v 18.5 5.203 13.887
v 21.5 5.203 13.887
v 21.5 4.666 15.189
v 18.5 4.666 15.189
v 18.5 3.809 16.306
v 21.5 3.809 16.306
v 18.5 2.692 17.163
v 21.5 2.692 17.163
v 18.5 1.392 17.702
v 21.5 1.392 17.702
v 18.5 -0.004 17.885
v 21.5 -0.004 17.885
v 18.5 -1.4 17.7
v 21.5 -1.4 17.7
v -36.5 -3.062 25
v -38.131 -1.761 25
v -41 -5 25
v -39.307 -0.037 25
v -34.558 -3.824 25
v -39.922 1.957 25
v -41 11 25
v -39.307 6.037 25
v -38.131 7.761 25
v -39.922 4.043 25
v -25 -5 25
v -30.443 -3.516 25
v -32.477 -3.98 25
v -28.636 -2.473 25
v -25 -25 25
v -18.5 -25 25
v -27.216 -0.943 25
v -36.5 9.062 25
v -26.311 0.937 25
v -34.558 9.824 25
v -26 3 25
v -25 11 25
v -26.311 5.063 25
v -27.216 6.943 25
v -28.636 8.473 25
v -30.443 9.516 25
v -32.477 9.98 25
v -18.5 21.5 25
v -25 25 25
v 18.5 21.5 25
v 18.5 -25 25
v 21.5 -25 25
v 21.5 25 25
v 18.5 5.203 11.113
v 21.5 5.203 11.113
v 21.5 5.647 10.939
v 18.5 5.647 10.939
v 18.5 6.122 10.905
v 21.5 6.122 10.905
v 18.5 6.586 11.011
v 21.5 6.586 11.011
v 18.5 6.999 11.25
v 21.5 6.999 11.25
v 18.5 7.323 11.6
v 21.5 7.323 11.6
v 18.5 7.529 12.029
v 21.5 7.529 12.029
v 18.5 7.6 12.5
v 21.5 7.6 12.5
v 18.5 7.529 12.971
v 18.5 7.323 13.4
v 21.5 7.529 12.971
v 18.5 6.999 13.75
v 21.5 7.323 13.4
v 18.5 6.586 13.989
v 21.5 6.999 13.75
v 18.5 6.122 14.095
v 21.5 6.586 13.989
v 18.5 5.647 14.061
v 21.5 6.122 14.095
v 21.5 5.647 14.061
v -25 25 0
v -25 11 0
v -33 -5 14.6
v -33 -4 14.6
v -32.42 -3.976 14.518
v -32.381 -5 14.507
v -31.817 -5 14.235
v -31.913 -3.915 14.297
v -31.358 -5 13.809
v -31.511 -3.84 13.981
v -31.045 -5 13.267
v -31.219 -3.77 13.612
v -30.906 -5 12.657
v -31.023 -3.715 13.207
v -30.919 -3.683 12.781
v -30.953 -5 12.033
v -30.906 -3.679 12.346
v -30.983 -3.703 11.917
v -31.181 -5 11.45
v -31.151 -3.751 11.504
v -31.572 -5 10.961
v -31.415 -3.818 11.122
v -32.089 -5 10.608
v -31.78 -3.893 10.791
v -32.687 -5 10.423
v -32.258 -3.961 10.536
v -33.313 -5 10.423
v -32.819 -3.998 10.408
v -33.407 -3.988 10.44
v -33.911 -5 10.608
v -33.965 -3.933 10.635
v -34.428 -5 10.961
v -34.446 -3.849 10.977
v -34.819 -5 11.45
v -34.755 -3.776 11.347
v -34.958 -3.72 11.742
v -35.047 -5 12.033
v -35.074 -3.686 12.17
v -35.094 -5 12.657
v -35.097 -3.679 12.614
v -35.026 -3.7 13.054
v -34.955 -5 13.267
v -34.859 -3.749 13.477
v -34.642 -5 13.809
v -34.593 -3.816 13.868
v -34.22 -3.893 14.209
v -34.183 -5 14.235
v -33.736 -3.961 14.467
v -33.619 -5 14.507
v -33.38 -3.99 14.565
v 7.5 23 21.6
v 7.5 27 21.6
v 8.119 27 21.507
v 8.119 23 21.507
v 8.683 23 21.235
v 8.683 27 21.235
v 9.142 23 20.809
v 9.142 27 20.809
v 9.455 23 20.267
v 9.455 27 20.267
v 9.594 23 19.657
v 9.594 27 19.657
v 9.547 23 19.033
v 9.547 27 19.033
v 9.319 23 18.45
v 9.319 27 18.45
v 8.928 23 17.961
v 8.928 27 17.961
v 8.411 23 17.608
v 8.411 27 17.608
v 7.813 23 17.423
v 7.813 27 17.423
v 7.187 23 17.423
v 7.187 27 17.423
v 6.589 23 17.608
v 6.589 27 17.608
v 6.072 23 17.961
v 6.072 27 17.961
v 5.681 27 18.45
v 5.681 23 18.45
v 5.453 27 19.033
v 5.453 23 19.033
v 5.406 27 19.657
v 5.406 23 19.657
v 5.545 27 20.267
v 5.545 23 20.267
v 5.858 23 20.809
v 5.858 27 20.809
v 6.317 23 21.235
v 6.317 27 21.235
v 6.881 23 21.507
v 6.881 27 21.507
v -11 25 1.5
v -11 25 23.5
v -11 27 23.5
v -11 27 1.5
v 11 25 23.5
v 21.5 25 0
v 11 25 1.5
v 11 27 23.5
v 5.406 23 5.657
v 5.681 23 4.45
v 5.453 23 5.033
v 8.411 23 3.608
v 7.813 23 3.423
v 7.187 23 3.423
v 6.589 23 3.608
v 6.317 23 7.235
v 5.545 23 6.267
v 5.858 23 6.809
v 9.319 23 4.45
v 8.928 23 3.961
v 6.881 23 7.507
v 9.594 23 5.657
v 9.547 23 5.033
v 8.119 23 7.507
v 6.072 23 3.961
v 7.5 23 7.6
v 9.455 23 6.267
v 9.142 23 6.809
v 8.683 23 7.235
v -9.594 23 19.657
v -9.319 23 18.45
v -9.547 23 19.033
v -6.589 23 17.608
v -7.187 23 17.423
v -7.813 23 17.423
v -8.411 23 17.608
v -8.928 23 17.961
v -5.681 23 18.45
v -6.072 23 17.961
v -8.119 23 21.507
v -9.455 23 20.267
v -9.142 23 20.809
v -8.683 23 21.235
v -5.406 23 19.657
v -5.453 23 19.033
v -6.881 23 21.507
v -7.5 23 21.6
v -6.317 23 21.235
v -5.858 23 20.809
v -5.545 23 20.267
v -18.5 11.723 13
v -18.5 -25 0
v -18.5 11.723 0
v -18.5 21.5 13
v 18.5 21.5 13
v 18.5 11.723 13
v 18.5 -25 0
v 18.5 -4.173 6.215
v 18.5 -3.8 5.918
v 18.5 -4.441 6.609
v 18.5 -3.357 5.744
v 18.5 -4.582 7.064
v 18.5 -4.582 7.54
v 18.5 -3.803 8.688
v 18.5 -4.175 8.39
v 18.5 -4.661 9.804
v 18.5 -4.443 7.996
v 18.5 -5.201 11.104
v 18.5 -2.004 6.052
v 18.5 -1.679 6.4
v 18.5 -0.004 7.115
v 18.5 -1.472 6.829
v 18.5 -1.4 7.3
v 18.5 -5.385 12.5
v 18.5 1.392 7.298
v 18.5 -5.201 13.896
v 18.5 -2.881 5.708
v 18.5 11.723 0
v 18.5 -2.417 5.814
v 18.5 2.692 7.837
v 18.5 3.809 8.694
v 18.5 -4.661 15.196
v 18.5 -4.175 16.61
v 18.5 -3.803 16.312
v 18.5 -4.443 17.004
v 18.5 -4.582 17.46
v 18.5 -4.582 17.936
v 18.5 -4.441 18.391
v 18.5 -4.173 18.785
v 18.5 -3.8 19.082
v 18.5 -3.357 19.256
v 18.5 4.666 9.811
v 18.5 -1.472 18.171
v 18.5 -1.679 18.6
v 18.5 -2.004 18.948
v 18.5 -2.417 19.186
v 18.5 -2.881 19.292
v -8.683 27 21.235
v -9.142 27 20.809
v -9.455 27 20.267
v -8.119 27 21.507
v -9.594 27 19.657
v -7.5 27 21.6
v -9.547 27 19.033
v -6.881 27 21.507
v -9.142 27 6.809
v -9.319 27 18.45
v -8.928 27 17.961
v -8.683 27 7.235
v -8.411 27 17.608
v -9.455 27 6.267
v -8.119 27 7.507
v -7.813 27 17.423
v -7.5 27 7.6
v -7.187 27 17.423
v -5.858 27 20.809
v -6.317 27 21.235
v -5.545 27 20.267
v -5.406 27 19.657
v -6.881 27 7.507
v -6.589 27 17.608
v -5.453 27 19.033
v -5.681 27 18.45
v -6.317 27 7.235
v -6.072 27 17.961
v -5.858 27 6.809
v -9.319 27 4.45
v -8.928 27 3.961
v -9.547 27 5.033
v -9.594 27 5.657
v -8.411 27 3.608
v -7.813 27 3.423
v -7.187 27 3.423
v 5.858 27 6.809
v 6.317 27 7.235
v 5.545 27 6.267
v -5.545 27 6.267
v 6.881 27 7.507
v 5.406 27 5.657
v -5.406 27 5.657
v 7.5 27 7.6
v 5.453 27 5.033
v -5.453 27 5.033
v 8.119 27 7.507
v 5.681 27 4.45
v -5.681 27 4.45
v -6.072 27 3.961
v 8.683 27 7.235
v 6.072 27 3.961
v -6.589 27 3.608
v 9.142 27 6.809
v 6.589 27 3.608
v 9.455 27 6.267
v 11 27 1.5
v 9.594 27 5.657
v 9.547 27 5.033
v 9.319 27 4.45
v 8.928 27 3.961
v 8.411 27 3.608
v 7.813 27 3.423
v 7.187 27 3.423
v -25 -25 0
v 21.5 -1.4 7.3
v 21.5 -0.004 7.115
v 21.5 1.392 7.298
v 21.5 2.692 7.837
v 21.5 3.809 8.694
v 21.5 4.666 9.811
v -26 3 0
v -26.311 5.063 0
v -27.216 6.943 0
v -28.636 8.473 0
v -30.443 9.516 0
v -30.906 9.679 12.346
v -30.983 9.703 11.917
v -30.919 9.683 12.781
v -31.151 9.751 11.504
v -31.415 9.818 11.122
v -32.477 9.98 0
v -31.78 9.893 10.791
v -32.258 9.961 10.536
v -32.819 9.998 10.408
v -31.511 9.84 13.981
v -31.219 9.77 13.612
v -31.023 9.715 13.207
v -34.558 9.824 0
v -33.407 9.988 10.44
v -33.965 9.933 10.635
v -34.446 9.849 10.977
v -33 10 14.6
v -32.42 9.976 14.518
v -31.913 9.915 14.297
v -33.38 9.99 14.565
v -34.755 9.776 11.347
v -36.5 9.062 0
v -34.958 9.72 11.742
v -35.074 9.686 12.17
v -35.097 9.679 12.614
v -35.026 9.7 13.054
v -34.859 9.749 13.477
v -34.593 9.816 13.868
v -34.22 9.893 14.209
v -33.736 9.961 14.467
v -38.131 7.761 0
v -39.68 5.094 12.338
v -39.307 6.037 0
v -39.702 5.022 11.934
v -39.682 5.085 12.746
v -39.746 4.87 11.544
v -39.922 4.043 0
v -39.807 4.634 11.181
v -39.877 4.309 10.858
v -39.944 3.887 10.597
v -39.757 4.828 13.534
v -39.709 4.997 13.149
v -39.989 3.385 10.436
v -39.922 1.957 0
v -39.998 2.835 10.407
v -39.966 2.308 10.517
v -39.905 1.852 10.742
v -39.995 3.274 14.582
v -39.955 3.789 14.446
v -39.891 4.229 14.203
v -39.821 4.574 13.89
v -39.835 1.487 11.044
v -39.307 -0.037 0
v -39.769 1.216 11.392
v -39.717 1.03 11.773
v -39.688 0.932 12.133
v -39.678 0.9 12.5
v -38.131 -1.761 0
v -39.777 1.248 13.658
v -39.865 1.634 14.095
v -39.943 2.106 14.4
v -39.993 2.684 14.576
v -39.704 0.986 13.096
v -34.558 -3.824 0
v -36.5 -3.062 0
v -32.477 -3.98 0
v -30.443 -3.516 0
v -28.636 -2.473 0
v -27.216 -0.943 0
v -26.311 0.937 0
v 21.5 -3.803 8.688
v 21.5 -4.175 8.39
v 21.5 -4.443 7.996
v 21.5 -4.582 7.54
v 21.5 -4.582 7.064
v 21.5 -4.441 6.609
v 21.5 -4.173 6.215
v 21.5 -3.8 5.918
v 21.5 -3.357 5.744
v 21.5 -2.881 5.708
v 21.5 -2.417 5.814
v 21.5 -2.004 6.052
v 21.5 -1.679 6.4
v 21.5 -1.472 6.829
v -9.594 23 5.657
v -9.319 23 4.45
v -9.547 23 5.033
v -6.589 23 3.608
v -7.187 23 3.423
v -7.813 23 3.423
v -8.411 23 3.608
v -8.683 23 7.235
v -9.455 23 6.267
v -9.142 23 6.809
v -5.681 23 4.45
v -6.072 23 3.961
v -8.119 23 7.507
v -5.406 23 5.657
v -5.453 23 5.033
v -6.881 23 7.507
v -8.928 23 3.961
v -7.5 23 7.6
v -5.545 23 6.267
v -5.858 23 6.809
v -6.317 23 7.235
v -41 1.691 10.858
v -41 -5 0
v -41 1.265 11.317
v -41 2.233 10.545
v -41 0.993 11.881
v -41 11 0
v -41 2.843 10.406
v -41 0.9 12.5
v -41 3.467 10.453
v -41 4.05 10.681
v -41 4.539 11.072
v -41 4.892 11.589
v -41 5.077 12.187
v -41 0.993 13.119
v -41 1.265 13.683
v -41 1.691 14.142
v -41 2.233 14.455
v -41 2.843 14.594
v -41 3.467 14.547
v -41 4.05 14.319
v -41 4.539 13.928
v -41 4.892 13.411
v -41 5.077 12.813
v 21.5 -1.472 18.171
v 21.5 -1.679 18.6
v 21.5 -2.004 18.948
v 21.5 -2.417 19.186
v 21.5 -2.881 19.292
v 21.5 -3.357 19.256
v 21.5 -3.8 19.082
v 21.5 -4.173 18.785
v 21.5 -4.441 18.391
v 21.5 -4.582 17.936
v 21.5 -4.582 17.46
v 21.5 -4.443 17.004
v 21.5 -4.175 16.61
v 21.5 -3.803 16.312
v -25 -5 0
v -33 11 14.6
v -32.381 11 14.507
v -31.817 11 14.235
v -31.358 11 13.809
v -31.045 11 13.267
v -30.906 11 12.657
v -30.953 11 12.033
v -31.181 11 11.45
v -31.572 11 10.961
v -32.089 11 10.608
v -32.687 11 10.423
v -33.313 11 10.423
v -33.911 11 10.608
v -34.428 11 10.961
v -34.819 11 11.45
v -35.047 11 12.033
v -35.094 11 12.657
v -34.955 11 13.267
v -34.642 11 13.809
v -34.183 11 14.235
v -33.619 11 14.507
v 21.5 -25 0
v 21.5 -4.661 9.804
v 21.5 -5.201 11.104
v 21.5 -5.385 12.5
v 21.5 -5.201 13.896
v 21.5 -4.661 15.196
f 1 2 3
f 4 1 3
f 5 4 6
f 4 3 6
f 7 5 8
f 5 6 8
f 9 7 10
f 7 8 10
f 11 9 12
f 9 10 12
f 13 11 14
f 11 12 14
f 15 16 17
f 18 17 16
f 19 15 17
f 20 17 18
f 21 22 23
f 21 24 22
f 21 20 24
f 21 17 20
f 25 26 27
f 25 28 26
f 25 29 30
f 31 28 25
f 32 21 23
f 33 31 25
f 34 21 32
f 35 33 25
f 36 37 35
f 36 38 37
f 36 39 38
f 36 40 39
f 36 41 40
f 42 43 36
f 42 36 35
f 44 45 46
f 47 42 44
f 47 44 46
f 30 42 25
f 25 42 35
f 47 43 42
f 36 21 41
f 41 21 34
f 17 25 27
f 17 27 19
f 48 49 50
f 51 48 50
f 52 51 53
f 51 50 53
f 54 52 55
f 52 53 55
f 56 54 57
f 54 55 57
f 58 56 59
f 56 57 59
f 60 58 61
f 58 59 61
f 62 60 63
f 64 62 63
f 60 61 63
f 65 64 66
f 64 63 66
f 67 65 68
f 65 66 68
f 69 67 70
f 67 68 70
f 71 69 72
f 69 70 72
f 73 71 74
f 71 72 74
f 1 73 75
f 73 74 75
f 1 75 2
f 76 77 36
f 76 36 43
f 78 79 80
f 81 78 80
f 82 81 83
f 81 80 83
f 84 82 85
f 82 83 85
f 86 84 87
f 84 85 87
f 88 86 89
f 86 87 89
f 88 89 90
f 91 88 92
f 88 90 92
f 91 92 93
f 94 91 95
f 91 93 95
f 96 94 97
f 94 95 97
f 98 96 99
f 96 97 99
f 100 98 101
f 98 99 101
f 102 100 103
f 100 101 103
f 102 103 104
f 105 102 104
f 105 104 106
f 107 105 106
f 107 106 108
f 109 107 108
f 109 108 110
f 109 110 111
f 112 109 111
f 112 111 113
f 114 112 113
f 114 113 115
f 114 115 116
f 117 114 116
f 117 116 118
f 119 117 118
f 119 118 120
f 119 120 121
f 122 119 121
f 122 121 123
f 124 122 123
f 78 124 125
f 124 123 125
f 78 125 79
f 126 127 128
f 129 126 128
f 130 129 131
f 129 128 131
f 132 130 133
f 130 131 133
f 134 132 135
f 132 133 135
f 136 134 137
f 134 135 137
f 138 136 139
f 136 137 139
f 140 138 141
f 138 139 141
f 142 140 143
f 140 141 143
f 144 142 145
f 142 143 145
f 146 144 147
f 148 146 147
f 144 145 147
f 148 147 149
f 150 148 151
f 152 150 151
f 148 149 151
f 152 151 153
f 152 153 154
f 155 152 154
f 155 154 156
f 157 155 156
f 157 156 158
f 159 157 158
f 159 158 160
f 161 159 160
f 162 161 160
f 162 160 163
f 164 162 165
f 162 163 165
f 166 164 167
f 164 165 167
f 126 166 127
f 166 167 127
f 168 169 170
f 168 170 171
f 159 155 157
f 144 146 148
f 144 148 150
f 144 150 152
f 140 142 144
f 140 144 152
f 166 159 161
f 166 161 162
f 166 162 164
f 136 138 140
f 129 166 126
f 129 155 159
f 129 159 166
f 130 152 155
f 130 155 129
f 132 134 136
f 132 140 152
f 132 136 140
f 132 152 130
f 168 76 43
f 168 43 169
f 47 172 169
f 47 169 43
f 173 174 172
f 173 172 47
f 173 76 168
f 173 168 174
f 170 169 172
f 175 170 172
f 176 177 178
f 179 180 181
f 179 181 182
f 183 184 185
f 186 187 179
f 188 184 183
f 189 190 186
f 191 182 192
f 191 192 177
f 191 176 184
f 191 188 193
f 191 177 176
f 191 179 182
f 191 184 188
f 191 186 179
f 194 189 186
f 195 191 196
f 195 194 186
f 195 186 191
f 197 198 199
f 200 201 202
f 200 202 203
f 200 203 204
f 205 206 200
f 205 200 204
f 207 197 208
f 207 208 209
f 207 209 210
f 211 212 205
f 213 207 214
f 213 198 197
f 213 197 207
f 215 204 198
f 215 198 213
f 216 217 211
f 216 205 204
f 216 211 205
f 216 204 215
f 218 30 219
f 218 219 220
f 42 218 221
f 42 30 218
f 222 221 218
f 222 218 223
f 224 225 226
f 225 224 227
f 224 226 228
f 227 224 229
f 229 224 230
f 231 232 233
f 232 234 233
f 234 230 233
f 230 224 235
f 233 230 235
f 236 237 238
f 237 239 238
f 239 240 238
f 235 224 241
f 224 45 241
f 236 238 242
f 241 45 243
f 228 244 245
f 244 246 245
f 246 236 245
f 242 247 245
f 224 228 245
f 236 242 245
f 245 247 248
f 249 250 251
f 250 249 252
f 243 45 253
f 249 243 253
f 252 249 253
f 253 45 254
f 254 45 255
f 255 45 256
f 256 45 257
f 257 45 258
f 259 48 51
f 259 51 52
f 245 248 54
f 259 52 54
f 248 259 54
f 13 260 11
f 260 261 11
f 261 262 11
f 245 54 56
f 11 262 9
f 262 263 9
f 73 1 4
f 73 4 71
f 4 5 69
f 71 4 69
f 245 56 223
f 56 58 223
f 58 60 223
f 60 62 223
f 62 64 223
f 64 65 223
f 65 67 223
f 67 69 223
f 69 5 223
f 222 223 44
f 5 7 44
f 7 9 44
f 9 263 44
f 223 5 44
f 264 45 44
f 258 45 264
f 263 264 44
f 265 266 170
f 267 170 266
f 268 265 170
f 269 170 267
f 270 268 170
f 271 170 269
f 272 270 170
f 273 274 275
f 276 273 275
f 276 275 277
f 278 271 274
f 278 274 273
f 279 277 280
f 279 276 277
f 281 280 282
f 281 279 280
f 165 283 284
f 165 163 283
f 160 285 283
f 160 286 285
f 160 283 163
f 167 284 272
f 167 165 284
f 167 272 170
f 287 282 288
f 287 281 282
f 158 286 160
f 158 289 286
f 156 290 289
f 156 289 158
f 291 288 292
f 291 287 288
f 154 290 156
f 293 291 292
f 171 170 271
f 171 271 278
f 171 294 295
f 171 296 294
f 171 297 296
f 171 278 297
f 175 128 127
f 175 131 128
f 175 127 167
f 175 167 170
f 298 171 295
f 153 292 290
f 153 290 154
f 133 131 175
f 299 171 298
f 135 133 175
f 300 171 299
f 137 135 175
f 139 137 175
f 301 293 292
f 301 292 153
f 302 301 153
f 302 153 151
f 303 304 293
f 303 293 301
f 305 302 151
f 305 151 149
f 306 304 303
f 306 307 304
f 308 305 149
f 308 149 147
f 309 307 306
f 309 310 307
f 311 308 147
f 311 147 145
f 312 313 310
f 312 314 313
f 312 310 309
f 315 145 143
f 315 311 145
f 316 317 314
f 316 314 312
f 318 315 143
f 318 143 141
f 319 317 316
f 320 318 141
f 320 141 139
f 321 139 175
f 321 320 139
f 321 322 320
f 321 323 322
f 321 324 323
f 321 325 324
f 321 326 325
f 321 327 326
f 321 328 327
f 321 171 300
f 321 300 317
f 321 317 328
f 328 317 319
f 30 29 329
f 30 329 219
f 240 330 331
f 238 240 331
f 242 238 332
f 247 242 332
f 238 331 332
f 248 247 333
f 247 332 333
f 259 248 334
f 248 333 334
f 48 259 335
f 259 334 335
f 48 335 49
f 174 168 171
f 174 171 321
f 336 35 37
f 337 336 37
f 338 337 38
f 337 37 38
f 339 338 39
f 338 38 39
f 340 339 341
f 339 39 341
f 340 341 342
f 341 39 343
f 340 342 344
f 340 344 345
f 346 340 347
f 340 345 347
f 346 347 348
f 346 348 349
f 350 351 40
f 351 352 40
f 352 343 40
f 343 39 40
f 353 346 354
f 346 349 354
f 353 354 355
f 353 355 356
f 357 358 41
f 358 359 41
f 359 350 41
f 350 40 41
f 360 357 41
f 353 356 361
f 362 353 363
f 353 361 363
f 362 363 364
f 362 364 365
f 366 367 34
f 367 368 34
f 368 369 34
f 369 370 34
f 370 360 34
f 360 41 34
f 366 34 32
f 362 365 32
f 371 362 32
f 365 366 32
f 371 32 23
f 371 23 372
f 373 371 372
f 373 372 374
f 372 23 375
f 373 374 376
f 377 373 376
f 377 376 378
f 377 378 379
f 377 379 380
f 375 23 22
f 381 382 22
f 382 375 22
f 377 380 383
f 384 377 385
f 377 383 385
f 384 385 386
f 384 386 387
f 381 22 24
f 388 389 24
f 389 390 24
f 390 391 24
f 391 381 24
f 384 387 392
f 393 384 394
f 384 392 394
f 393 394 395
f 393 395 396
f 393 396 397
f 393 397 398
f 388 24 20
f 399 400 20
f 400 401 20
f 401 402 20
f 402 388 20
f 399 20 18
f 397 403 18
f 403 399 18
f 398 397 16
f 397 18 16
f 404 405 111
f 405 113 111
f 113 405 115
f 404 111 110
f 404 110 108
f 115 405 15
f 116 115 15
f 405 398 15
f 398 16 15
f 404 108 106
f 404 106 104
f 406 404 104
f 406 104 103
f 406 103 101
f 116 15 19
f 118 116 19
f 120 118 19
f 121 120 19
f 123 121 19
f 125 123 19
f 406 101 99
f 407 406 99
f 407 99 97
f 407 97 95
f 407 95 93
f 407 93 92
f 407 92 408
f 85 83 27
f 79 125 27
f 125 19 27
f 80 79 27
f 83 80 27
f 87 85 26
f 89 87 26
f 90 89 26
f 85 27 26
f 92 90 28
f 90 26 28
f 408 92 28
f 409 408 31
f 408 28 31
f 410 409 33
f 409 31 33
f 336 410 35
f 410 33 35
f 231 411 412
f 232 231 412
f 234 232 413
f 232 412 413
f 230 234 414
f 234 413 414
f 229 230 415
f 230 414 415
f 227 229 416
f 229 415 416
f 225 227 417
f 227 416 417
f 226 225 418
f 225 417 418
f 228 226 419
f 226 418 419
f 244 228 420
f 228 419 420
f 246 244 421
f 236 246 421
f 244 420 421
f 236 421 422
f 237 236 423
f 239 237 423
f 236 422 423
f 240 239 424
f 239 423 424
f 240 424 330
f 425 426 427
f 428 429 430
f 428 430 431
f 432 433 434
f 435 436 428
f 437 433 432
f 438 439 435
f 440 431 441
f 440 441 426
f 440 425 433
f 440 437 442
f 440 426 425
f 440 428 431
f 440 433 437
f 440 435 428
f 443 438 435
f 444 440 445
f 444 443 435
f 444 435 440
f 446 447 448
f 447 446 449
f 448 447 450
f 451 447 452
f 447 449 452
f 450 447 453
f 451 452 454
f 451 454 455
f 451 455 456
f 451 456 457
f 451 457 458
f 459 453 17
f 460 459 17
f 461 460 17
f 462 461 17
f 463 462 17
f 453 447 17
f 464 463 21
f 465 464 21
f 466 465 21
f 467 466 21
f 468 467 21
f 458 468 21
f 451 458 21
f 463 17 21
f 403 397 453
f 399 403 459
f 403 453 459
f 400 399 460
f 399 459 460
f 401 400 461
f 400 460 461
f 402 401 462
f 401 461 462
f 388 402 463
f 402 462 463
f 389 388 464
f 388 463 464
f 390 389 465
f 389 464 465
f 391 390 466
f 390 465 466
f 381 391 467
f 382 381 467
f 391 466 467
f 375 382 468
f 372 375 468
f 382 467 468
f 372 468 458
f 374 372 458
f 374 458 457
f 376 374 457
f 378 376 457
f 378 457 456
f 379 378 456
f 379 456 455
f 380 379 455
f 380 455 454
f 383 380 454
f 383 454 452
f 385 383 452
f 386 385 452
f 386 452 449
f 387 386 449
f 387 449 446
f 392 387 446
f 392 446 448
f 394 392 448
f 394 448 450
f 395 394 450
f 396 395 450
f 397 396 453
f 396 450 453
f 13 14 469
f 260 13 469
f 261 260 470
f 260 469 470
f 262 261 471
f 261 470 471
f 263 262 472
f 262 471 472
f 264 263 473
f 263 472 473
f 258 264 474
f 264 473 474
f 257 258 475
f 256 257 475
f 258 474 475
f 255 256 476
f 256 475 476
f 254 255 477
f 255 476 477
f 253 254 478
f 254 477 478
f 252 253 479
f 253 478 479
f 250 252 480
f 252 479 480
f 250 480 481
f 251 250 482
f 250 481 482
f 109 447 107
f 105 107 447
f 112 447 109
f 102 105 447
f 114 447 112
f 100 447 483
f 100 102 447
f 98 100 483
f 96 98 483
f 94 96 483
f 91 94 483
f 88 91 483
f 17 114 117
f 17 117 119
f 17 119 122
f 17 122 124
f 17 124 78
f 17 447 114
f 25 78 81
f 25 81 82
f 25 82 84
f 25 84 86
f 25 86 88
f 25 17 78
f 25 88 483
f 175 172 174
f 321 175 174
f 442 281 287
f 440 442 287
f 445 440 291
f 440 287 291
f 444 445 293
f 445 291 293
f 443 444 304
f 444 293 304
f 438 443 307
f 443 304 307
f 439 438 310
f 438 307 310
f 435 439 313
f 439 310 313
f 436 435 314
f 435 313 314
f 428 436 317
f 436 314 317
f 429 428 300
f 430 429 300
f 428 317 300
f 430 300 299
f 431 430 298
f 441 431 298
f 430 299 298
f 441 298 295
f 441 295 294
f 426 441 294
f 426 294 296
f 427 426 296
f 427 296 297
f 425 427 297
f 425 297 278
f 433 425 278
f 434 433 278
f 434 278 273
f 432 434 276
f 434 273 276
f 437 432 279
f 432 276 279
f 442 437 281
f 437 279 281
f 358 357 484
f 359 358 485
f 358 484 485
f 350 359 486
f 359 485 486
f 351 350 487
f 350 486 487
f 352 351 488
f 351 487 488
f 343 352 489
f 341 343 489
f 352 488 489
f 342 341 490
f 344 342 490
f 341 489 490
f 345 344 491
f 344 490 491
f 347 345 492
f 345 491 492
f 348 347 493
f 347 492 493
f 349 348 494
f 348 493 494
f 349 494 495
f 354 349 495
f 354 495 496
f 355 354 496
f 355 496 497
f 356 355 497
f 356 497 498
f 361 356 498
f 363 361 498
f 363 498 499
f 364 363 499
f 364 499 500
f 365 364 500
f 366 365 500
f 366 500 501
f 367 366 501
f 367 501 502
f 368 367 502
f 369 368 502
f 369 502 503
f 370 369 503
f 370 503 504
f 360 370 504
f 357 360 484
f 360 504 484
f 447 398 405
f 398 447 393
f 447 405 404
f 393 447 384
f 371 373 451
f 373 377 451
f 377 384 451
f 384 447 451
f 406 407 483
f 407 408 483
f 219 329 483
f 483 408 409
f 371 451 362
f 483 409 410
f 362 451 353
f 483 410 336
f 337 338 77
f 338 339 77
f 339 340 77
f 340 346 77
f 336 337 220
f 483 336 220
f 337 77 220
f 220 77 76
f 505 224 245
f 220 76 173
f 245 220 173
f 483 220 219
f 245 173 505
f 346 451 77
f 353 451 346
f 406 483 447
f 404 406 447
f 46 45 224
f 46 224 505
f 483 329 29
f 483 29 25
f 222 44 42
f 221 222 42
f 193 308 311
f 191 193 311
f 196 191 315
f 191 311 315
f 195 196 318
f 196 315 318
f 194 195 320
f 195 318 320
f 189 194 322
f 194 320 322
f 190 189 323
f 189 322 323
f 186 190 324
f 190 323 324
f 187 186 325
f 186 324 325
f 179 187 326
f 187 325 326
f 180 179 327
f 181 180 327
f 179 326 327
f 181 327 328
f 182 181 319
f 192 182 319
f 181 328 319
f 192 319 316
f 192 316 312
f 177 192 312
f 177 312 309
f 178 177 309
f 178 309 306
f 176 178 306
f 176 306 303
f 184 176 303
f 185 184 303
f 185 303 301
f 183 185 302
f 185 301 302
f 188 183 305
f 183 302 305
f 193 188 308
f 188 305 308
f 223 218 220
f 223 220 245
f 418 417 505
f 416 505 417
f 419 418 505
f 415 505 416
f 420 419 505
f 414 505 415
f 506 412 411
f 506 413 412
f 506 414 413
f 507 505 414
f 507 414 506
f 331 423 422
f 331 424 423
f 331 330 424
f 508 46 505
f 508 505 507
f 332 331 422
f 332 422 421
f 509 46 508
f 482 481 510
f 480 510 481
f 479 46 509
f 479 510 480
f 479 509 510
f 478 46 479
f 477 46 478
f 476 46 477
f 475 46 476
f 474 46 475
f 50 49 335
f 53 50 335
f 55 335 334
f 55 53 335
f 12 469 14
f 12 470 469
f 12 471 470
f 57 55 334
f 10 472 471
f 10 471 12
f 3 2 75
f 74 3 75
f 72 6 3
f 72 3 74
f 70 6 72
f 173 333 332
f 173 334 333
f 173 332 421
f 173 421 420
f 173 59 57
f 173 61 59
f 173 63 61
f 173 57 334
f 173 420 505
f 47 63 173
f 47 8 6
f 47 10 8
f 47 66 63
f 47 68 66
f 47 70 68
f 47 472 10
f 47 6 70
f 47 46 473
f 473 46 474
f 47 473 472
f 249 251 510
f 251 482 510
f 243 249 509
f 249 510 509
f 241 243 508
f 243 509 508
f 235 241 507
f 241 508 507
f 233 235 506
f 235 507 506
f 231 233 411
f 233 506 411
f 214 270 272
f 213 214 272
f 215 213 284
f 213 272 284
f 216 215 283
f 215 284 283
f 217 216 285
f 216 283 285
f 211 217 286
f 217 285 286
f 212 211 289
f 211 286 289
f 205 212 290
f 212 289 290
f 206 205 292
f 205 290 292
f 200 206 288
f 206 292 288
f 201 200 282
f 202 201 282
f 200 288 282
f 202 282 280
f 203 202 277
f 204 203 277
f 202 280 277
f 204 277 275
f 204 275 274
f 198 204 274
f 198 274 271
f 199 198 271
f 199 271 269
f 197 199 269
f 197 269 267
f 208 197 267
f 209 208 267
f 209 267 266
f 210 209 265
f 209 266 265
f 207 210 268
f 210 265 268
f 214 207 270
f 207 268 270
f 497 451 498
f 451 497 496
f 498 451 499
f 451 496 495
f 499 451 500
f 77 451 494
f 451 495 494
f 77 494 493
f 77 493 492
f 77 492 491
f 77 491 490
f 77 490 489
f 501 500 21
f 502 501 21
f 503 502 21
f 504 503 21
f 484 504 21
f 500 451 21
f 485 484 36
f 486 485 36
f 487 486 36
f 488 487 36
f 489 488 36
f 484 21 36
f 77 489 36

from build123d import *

# Parameters (mm, degrees)
SKETCH_1_W           = 50
SKETCH_1_H           = 50
EXTRUDE_1_DEPTH      = 25
CUT_EXTRUDE_1_DEPTH  = 12
SKETCH_5_W           = 16
SKETCH_5_H           = 16
EXTRUDE_2_DEPTH      = 25
SKETCH_6_R           = 7
CUT_EXTRUDE_3_DEPTH  = 25
SKETCH_7_R           = 2.1
CUT_EXTRUDE_4_DEPTH  = 7
SKETCH_10_R          = 2.1
CUT_EXTRUDE_5_DEPTH  = 26
SKETCH_15_W          = 22
SKETCH_15_H          = 22
EXTRUDE_3_DEPTH      = 2
SKETCH_16_R          = 2.1
CUT_EXTRUDE_6_DEPTH  = 4
SKETCH_24_W          = 37
SKETCH_24_H          = 37.580500644
CUT_EXTRUDE_7_DEPTH  = 25
SKETCH_23_R          = 1.6
CUT_EXTRUDE_8_DEPTH  = 11
SKETCH_25_R          = 5.384887306
CUT_EXTRUDE_9_DEPTH  = 9
SKETCH_27_W          = 3.5
SKETCH_27_H          = 50
CUT_EXTRUDE_10_DEPTH = 25


with BuildPart() as part:
    # 草图1 → 凸台-拉伸1 (new body)
    with BuildSketch(Plane.XY):
        Rectangle(SKETCH_1_W, SKETCH_1_H)
    extrude(amount=EXTRUDE_1_DEPTH)

    # 草图3 → 切除-拉伸1 (cut)
    with BuildSketch(Plane.XY.offset(25)):
        Polygon((-18.5, -15.5), (-18.5, -25), (18.5, -25), (18.5, -15.5), (18.5, 21.5), (-18.5, 21.5), align=None)
    extrude(amount=-CUT_EXTRUDE_1_DEPTH, mode=Mode.SUBTRACT)

    # 草图5 → 凸台-拉伸2 (add)
    with BuildSketch(Plane.XY.offset(25)):
        with Locations((-33, 3)):
            Rectangle(SKETCH_5_W, SKETCH_5_H)
    extrude(amount=-EXTRUDE_2_DEPTH)

    # 草图6 → 切除-拉伸3 (cut)
    with BuildSketch(Plane.XY.offset(25)):
        with Locations((-33, 3)):
            Circle(SKETCH_6_R)
    extrude(amount=-CUT_EXTRUDE_3_DEPTH, mode=Mode.SUBTRACT)

    # 草图7 → 切除-拉伸4 (cut)
    with BuildSketch(Plane.ZY.offset(41)):
        with Locations(Location((12.5, 3, 0), (0, 0, 270))):
            Circle(SKETCH_7_R)
    extrude(amount=-CUT_EXTRUDE_4_DEPTH, mode=Mode.SUBTRACT)

    # 草图10 → 切除-拉伸5 (cut)
    with BuildSketch(Plane(origin=(0, 11, 0), x_dir=(1, 0, 0), z_dir=(0, 1, 0))):
        with Locations(Location((-33, -12.5, 0), (0, 0, 270))):
            Circle(SKETCH_10_R)
    extrude(amount=-CUT_EXTRUDE_5_DEPTH, mode=Mode.SUBTRACT)

    # 草图15 → 凸台-拉伸3 (add)
    with BuildSketch(Plane(origin=(0, 25, 0), x_dir=(1, 0, 0), z_dir=(0, 1, 0))):
        with Locations((0, -12.5)):
            Rectangle(SKETCH_15_W, SKETCH_15_H)
    extrude(amount=EXTRUDE_3_DEPTH)

    # 草图16 → 切除-拉伸6 (cut)
    with BuildSketch(Plane(origin=(0, 27, 0), x_dir=(1, 0, 0), z_dir=(0, 1, 0))):
        with Locations(Location((-7.5, -5.5, 0), (0, 0, 270))):
            Circle(SKETCH_16_R)
        with Locations(Location((7.5, -5.5, 0), (0, 0, 270))):
            Circle(SKETCH_16_R)
        with Locations(Location((-7.5, -19.5, 0), (0, 0, 270))):
            Circle(SKETCH_16_R)
        with Locations(Location((7.5, -19.5, 0), (0, 0, 270))):
            Circle(SKETCH_16_R)
    extrude(amount=-CUT_EXTRUDE_6_DEPTH, mode=Mode.SUBTRACT)

    # 草图24 → 切除-拉伸7 (cut)
    with BuildSketch(Plane.XY.offset(13)):
        with Locations((0, -7.067744148)):
            Rectangle(SKETCH_24_W, SKETCH_24_H)
    extrude(amount=-CUT_EXTRUDE_7_DEPTH, mode=Mode.SUBTRACT)

    # 草图23 → 切除-拉伸8 (cut)
    with BuildSketch(Plane(origin=(25, 0, 0), x_dir=(0, 0, -1), z_dir=(1, 0, 0))):
        with Locations(Location((-12.5, 6, 0), (0, 0, 90))):
            Circle(SKETCH_23_R)
        with Locations(Location((-7.303847577, -3, 0), (0, 0, 90))):
            Circle(SKETCH_23_R)
        with Locations(Location((-17.696152423, -3, 0), (0, 0, 90))):
            Circle(SKETCH_23_R)
    extrude(amount=-CUT_EXTRUDE_8_DEPTH, mode=Mode.SUBTRACT)

    # 草图25 → 切除-拉伸9 (cut)
    with BuildSketch(Plane(origin=(25, 0, 0), x_dir=(0, 0, -1), z_dir=(1, 0, 0))):
        with Locations((-12.5, 0)):
            Circle(SKETCH_25_R)
    extrude(amount=-CUT_EXTRUDE_9_DEPTH, mode=Mode.SUBTRACT)

    # 草图27 → 切除-拉伸10 (cut)
    with BuildSketch(Plane.XY.offset(25)):
        with Locations((23.25, 0)):
            Rectangle(SKETCH_27_W, SKETCH_27_H)
    extrude(amount=-CUT_EXTRUDE_10_DEPTH, mode=Mode.SUBTRACT)


solid = part.part
